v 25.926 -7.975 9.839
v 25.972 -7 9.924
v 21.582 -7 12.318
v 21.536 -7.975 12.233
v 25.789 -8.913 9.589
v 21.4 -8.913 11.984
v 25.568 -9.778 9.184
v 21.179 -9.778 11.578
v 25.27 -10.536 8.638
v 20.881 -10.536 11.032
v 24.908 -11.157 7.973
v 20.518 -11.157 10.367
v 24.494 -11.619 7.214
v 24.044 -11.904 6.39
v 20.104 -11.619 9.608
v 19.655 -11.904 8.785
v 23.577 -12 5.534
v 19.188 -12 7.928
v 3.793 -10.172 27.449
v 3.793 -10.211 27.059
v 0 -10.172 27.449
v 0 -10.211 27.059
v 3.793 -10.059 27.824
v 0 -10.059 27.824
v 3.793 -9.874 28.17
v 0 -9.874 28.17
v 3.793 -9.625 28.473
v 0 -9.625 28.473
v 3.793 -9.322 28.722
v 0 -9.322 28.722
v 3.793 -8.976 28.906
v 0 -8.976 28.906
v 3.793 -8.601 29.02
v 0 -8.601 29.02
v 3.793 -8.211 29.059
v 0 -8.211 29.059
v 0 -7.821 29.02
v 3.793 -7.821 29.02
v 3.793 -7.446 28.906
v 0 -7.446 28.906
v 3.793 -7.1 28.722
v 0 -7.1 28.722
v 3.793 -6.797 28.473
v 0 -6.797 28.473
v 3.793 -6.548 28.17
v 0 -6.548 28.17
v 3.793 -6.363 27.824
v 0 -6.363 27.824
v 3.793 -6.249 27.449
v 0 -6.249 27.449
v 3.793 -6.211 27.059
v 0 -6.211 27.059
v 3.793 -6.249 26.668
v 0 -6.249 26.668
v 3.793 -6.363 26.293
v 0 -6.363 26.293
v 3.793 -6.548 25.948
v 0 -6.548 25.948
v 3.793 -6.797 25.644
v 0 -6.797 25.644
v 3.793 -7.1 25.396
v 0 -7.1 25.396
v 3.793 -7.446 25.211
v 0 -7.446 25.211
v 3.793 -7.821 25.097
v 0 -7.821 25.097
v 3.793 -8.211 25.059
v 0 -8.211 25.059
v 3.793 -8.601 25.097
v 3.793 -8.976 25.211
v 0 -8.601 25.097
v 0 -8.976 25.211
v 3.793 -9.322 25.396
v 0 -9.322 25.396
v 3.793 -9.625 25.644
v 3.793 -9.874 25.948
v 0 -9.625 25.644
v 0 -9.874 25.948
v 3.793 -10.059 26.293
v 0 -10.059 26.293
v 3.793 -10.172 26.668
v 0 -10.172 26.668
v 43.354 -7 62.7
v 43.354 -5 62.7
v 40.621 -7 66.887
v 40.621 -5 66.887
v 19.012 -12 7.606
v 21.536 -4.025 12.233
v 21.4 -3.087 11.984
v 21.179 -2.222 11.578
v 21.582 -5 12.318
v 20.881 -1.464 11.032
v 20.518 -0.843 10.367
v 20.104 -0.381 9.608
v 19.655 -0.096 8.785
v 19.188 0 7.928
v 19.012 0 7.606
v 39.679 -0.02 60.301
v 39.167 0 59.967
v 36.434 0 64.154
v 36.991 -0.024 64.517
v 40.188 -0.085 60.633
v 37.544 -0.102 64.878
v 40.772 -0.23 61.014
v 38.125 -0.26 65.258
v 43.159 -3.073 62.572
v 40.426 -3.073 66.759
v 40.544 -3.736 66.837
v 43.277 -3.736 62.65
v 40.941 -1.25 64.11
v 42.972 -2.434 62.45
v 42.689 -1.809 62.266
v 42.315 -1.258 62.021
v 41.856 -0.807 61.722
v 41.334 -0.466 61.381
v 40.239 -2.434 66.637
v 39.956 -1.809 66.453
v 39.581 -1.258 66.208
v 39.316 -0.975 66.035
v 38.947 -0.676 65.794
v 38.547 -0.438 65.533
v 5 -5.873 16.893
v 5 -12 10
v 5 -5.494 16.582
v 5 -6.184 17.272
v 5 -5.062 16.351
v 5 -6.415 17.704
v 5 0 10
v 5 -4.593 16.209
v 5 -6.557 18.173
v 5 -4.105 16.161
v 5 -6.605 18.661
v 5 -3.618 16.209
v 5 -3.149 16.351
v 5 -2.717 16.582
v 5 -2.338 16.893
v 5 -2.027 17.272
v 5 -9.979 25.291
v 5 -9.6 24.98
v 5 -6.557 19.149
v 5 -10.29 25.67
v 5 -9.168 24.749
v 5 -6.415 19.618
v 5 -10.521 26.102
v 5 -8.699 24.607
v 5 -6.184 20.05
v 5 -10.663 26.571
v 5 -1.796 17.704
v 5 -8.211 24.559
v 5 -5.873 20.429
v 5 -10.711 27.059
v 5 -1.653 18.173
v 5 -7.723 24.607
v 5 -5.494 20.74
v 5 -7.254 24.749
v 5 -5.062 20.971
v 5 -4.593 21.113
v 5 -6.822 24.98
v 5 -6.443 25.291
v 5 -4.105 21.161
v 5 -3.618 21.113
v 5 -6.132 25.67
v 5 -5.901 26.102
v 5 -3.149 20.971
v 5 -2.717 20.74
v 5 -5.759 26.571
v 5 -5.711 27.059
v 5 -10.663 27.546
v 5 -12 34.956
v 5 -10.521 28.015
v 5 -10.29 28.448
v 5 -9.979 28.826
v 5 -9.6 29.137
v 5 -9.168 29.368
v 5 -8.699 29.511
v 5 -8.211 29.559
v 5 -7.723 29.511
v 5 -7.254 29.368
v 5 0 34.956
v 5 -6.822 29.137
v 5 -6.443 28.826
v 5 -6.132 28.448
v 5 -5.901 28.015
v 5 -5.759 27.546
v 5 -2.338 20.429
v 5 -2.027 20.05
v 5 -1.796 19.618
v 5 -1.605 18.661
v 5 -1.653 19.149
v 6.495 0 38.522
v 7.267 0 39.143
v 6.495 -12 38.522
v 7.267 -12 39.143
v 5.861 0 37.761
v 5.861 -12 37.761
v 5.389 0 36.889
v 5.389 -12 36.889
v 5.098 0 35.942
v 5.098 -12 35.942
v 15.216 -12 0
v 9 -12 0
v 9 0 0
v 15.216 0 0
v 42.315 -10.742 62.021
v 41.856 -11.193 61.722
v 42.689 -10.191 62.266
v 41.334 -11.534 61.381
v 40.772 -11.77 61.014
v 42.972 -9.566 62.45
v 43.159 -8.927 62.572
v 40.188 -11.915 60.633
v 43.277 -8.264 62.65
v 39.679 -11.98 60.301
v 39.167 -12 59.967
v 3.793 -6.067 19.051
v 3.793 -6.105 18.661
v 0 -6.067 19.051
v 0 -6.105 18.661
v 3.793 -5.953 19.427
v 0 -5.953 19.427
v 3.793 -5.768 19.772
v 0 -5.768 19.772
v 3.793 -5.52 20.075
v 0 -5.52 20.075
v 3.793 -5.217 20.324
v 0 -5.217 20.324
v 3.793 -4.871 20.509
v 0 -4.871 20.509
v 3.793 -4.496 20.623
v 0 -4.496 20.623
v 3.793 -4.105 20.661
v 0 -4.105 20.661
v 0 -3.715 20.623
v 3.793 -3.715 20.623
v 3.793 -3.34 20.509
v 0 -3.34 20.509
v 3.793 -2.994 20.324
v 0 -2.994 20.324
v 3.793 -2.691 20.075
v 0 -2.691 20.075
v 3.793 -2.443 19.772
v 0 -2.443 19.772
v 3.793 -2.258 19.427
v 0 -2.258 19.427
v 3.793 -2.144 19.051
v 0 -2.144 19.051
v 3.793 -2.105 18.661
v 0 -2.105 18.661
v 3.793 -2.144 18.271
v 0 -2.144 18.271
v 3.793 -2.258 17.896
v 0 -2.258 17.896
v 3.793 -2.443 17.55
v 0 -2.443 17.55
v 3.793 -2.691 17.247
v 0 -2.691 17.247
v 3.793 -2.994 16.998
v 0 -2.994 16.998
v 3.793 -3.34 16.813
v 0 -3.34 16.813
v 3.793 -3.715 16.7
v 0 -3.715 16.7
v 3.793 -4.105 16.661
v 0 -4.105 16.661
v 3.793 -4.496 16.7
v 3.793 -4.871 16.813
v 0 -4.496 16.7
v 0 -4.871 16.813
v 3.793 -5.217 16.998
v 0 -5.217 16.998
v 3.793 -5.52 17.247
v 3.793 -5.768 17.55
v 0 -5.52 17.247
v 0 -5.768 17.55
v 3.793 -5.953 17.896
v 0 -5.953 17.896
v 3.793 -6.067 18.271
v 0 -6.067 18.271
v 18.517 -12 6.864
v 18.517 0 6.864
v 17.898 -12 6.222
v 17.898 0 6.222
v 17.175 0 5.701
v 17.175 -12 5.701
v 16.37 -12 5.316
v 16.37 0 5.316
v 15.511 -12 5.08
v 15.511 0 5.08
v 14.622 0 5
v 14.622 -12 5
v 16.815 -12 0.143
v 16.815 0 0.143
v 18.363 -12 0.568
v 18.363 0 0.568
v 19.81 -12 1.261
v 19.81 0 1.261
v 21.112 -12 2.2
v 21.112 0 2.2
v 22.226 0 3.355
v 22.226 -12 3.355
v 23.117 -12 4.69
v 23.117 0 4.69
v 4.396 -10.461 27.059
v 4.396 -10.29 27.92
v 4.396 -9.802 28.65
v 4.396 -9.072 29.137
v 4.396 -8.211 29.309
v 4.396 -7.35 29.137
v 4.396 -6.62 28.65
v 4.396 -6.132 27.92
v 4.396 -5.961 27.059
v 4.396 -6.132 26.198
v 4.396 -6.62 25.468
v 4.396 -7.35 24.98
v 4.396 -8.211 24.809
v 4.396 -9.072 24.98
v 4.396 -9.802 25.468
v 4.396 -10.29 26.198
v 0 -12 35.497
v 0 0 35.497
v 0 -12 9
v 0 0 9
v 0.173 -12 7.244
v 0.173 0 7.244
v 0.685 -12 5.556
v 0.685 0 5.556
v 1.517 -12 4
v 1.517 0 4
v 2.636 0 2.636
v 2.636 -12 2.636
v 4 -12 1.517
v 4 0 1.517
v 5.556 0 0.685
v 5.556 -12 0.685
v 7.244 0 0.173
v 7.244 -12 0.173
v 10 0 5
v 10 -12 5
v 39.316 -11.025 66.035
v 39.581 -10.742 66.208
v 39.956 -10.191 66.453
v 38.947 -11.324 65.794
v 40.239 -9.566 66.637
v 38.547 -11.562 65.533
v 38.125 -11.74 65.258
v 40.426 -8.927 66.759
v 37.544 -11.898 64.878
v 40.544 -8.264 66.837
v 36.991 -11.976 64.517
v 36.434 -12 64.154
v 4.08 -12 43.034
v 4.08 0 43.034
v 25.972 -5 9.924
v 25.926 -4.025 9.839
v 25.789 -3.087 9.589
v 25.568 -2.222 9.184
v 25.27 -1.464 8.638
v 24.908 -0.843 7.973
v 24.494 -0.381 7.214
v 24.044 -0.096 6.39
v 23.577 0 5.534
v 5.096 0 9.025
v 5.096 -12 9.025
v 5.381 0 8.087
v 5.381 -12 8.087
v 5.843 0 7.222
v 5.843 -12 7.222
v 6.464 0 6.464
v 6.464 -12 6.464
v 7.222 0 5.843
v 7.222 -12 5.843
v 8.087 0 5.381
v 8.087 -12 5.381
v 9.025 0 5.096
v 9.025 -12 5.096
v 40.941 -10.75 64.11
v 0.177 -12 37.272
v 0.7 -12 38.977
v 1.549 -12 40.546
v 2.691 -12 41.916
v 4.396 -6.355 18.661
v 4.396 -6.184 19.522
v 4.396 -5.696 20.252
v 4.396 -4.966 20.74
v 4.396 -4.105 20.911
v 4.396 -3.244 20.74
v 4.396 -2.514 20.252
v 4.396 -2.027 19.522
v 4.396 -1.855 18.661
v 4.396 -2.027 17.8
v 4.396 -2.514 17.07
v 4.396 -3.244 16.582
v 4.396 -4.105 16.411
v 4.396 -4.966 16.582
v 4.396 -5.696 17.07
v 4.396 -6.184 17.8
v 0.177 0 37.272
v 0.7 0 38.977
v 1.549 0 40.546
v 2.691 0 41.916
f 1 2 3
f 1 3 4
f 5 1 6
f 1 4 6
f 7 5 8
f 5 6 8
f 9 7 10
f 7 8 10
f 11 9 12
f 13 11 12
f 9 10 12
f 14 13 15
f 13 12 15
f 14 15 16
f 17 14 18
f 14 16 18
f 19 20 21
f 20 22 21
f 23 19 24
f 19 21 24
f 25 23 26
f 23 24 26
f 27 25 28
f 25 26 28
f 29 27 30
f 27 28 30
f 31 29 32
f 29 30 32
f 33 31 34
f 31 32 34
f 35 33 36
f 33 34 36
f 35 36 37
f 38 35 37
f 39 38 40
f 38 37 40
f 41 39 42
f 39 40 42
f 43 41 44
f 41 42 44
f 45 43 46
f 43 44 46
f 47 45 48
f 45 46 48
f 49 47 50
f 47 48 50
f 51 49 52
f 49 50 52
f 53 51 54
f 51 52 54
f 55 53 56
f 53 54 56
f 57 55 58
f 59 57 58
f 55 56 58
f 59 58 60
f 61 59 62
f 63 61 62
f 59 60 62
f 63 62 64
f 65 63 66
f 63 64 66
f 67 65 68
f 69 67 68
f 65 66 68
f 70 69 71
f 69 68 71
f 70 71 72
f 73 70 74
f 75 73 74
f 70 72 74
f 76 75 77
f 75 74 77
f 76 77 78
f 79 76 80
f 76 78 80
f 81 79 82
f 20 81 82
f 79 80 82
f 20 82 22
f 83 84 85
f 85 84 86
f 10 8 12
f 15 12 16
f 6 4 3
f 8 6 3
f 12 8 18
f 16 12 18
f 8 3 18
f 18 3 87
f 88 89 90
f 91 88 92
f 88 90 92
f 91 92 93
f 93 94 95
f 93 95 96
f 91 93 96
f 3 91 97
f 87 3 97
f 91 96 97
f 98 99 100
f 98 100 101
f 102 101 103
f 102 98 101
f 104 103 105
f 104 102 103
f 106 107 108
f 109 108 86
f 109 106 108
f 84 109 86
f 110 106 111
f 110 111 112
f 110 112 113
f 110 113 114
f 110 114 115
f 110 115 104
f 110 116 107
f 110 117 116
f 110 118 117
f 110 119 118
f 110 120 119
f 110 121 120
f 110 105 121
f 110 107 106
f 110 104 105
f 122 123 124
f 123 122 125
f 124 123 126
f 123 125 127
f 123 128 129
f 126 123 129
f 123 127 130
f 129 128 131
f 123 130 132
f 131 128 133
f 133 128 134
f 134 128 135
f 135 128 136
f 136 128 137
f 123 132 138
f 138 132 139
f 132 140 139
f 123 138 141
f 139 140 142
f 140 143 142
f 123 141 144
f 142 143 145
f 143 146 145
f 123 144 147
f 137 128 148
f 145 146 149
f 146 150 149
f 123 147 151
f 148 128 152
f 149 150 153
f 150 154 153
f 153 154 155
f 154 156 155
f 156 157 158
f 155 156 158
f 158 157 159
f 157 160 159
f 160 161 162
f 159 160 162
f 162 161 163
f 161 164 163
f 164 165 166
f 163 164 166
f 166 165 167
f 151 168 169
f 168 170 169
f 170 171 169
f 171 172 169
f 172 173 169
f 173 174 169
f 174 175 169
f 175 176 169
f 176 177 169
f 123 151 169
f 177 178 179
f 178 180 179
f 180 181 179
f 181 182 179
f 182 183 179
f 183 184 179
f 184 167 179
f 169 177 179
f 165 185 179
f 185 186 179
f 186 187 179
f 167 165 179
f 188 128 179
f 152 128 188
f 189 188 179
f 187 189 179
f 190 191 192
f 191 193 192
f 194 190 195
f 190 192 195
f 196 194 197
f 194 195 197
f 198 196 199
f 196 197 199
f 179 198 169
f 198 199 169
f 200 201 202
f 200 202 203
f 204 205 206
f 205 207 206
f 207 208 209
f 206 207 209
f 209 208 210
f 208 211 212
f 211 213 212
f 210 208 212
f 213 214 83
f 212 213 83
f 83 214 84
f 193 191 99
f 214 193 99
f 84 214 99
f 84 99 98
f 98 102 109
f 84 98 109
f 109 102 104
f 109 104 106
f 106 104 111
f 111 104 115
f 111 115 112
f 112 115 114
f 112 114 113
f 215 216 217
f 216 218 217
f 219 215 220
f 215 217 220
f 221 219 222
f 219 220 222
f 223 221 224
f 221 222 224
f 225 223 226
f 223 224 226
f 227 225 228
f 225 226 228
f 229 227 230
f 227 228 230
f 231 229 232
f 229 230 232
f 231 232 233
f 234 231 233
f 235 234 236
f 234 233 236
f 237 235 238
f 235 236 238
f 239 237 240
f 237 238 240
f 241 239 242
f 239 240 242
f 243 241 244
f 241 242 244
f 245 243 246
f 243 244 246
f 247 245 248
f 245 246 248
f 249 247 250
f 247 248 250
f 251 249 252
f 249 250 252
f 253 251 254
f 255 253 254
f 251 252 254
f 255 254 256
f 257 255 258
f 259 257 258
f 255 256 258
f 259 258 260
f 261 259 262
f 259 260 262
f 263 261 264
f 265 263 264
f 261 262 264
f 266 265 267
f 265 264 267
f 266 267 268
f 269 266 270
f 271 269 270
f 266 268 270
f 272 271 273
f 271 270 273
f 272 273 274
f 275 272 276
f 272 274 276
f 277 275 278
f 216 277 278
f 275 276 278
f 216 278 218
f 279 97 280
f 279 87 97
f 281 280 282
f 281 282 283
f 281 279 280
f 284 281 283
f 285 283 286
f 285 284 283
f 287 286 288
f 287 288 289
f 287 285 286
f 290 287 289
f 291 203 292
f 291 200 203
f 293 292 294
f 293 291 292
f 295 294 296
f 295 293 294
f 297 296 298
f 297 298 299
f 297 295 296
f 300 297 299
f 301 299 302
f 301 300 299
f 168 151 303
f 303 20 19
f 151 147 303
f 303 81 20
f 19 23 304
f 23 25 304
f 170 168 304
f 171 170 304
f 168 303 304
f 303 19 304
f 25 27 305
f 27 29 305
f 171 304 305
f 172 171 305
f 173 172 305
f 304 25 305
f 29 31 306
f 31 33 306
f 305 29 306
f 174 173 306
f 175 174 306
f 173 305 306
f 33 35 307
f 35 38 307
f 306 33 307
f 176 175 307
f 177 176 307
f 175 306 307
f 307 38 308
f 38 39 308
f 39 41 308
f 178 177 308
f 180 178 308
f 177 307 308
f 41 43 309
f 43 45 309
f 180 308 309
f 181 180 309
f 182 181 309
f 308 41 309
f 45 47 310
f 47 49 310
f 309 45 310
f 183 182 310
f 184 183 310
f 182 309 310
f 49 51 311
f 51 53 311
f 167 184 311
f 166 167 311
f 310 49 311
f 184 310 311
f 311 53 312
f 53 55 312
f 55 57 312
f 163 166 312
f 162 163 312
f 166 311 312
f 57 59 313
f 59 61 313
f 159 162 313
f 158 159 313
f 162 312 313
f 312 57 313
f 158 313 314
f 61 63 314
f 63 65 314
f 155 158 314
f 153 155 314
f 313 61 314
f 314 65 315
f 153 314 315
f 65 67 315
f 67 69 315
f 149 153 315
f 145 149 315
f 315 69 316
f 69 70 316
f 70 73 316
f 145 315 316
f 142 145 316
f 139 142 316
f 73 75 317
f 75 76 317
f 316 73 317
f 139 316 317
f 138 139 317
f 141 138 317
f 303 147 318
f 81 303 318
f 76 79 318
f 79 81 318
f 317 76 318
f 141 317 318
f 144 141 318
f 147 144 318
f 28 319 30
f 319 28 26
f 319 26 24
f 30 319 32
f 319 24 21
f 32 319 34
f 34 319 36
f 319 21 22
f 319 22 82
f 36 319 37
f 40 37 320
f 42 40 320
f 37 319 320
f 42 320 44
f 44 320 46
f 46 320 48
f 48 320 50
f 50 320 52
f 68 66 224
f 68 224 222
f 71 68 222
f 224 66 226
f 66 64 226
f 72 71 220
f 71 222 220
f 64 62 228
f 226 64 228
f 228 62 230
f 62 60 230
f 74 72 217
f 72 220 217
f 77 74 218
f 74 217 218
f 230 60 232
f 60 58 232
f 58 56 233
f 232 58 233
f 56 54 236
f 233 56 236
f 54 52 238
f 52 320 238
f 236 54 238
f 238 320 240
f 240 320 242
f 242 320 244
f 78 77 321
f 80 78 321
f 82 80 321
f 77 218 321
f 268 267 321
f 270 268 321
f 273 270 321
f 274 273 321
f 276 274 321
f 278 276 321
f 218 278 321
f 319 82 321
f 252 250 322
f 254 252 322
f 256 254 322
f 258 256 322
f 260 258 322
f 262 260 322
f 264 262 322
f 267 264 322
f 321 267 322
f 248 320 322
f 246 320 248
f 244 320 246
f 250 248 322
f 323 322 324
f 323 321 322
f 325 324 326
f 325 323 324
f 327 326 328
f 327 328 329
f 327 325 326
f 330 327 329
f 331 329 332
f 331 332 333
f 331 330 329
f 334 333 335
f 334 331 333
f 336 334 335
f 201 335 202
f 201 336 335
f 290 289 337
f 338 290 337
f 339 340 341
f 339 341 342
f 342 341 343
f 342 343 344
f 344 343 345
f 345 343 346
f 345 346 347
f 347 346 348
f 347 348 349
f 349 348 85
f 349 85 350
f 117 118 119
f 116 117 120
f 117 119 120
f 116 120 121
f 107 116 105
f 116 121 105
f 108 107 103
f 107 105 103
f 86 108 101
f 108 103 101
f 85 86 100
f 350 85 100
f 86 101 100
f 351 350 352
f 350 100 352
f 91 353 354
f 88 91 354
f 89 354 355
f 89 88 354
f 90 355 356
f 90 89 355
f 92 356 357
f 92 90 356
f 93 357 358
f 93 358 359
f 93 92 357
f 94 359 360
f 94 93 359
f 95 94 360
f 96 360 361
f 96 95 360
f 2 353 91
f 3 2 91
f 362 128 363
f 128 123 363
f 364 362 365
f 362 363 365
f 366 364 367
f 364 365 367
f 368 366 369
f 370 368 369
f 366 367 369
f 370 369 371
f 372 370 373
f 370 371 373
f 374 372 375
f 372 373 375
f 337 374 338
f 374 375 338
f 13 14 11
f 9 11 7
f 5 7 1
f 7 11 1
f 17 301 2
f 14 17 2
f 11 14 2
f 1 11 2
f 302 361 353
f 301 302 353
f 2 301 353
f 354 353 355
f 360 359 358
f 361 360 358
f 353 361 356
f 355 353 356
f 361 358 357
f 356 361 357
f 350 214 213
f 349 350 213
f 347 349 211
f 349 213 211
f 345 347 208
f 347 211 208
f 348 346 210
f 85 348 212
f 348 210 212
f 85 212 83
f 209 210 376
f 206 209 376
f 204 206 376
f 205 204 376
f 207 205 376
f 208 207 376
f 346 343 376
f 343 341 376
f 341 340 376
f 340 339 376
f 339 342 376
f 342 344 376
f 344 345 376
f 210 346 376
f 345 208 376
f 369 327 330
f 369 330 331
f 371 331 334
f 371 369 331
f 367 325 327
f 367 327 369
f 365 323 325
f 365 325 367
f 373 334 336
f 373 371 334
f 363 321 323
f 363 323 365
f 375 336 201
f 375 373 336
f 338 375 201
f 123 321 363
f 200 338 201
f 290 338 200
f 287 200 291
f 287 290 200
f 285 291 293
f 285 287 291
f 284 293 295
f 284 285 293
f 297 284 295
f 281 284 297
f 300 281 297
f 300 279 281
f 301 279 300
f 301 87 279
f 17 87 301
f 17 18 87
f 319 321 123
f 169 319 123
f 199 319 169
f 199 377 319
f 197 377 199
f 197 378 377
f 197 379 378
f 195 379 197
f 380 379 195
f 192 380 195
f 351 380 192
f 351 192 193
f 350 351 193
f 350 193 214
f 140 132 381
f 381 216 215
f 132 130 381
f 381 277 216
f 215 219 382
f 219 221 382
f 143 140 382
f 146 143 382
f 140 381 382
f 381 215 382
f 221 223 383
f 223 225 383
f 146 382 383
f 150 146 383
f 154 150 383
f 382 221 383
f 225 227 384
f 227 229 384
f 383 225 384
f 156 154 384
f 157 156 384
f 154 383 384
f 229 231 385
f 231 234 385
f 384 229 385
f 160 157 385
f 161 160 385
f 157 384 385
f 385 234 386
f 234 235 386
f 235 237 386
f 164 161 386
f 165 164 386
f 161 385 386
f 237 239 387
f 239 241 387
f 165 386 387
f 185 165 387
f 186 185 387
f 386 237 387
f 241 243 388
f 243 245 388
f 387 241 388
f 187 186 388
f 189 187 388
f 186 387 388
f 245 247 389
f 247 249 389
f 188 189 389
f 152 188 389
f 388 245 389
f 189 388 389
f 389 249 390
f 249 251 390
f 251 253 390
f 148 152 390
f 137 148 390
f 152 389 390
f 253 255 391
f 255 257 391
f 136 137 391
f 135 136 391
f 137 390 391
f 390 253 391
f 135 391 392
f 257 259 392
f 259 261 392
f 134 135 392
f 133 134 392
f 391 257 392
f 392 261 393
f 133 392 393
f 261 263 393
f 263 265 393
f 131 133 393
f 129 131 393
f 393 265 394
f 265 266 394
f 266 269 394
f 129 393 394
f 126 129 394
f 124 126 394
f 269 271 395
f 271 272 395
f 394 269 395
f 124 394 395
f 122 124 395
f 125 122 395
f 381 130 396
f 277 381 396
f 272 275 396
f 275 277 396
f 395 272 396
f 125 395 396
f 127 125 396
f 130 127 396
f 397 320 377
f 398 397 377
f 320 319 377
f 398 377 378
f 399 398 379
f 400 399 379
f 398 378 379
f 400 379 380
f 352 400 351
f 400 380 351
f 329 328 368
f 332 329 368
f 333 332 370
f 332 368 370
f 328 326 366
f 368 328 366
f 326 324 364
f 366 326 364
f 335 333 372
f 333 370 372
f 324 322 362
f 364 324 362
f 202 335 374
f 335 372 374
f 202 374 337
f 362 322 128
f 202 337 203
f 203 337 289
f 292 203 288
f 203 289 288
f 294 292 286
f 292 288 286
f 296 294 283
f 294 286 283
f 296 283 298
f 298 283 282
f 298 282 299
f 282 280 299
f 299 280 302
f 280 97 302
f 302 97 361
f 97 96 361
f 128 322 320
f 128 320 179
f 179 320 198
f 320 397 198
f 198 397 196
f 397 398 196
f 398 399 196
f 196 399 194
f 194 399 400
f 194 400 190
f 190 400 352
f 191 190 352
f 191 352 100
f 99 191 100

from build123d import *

# Parameters (mm, degrees)
F1_DEPTH        = 12
F2_R            = 9
F3_R            = 5
F4_R            = 9
F5_R            = 5
F6_R            = 5
F7_R            = 5
F8_T1_DEPTH     = 30
F10_R           = 5
F11_R           = 9
F13_D           = 4
F13_CSINK_D     = 5
F13_CSINK_ANGLE = 45
F14_D           = 4
F14_CSINK_D     = 5
F14_CSINK_ANGLE = 45


# Not quite as in the source:
# - a fillet or chamfer that OpenCascade refuses, or shapes differently, is made with other operations: its cross-section is extruded or revolved along the edge and cut away or added


with BuildPart() as f1:
    # F0 (on Front) → F1 (new body)
    with BuildSketch(Plane.XZ):
        Polygon((0, 40.3702630328), (0, 0), (20.5587926316, 0), (25.9716099992, 9.9235005083), (21.5821319316, 12.3177607896), (17.5906268513, 5), (5, 5), (5, 37.6631405767), (43.3543724833, 62.7000143926), (40.621260608, 66.8869105553), align=None)
    extrude(amount=F1_DEPTH)

    # F2
    f2_edges = [f1.edges().sort_by_distance(p)[0] for p in [
        (20.558793, -6, 0),
    ]]
    fillet(f2_edges, radius=F2_R)

    # F3
    f3_edges = [f1.edges().sort_by_distance(p)[0] for p in [
        (17.590627, -6, 5),
    ]]
    fillet(f3_edges, radius=F3_R)

    # F4
    f4_edges = [f1.edges().sort_by_distance(p)[0] for p in [
        (0, -6, 40.370263),
    ]]
    fillet(f4_edges, radius=F4_R)

    # F5
    f5_edges = [f1.edges().sort_by_distance(p)[0] for p in [
        (5, -6, 37.663141),
    ]]
    fillet(f5_edges, radius=F5_R)

    # F6
    f6_edges = [f1.edges().sort_by_distance(p)[0] for p in [
        (23.776871, -12, 11.120631),
    ]]
    fillet(f6_edges, radius=F6_R)

    # F7
    f7_edges = [f1.edges().sort_by_distance(p)[0] for p in [
        (23.776871, 0, 11.120631),
    ]]
    fillet(f7_edges, radius=F7_R)

    # F8: fillet of radius 5 on 2 edges, made by hand

    # F8_s2 → F8_t1 (cut)
    with BuildSketch(Plane(origin=(-8.9127980143, 0, 13.6536525057), x_dir=(0, 1, 0), z_dir=(-0.5466223751, 0, 0.8373792325))):
        with BuildLine():
            add(Edge.make_bspline(
                [(-12, -65.577281941), (-12, -70.577281941), (-7, -70.577281941)],
                knots=[0, 0, 0, 1, 1, 1], degree=2, weights=[1, 1, 1]))
            Line((-7, -70.577281941), (-12, -70.577281941))
            Line((-12, -70.577281941), (-12, -65.577281941))
        make_face()
        with BuildLine():
            add(Edge.make_bspline(
                [(0, -65.577281941), (0, -70.577281941), (-5, -70.577281941)],
                knots=[0, 0, 0, 1, 1, 1], degree=2, weights=[1, 1, 1]))
            Line((-5, -70.577281941), (0, -70.577281941))
            Line((0, -70.577281941), (0, -65.577281941))
        make_face()
    extrude(amount=F8_T1_DEPTH, mode=Mode.SUBTRACT)

    # F10
    f10_edges = [f1.edges().sort_by_distance(p)[0] for p in [
        (5, -6, 5),
    ]]
    fillet(f10_edges, radius=F10_R)

    # F11
    f11_edges = [f1.edges().sort_by_distance(p)[0] for p in [
        (0, -6, 0),
    ]]
    fillet(f11_edges, radius=F11_R)

    # F13 (through all)
    with Locations(Plane.YZ.offset(5)):
        with Locations((-8.210901171, 27.0586498082)):
            CounterSinkHole(F13_D / 2, F13_CSINK_D / 2, counter_sink_angle=F13_CSINK_ANGLE)

    # F14 (through all)
    with Locations(Plane.YZ.offset(5)):
        with Locations((-4.1054510511, 18.6611376703)):
            CounterSinkHole(F14_D / 2, F14_CSINK_D / 2, counter_sink_angle=F14_CSINK_ANGLE)


solid = f1.part
